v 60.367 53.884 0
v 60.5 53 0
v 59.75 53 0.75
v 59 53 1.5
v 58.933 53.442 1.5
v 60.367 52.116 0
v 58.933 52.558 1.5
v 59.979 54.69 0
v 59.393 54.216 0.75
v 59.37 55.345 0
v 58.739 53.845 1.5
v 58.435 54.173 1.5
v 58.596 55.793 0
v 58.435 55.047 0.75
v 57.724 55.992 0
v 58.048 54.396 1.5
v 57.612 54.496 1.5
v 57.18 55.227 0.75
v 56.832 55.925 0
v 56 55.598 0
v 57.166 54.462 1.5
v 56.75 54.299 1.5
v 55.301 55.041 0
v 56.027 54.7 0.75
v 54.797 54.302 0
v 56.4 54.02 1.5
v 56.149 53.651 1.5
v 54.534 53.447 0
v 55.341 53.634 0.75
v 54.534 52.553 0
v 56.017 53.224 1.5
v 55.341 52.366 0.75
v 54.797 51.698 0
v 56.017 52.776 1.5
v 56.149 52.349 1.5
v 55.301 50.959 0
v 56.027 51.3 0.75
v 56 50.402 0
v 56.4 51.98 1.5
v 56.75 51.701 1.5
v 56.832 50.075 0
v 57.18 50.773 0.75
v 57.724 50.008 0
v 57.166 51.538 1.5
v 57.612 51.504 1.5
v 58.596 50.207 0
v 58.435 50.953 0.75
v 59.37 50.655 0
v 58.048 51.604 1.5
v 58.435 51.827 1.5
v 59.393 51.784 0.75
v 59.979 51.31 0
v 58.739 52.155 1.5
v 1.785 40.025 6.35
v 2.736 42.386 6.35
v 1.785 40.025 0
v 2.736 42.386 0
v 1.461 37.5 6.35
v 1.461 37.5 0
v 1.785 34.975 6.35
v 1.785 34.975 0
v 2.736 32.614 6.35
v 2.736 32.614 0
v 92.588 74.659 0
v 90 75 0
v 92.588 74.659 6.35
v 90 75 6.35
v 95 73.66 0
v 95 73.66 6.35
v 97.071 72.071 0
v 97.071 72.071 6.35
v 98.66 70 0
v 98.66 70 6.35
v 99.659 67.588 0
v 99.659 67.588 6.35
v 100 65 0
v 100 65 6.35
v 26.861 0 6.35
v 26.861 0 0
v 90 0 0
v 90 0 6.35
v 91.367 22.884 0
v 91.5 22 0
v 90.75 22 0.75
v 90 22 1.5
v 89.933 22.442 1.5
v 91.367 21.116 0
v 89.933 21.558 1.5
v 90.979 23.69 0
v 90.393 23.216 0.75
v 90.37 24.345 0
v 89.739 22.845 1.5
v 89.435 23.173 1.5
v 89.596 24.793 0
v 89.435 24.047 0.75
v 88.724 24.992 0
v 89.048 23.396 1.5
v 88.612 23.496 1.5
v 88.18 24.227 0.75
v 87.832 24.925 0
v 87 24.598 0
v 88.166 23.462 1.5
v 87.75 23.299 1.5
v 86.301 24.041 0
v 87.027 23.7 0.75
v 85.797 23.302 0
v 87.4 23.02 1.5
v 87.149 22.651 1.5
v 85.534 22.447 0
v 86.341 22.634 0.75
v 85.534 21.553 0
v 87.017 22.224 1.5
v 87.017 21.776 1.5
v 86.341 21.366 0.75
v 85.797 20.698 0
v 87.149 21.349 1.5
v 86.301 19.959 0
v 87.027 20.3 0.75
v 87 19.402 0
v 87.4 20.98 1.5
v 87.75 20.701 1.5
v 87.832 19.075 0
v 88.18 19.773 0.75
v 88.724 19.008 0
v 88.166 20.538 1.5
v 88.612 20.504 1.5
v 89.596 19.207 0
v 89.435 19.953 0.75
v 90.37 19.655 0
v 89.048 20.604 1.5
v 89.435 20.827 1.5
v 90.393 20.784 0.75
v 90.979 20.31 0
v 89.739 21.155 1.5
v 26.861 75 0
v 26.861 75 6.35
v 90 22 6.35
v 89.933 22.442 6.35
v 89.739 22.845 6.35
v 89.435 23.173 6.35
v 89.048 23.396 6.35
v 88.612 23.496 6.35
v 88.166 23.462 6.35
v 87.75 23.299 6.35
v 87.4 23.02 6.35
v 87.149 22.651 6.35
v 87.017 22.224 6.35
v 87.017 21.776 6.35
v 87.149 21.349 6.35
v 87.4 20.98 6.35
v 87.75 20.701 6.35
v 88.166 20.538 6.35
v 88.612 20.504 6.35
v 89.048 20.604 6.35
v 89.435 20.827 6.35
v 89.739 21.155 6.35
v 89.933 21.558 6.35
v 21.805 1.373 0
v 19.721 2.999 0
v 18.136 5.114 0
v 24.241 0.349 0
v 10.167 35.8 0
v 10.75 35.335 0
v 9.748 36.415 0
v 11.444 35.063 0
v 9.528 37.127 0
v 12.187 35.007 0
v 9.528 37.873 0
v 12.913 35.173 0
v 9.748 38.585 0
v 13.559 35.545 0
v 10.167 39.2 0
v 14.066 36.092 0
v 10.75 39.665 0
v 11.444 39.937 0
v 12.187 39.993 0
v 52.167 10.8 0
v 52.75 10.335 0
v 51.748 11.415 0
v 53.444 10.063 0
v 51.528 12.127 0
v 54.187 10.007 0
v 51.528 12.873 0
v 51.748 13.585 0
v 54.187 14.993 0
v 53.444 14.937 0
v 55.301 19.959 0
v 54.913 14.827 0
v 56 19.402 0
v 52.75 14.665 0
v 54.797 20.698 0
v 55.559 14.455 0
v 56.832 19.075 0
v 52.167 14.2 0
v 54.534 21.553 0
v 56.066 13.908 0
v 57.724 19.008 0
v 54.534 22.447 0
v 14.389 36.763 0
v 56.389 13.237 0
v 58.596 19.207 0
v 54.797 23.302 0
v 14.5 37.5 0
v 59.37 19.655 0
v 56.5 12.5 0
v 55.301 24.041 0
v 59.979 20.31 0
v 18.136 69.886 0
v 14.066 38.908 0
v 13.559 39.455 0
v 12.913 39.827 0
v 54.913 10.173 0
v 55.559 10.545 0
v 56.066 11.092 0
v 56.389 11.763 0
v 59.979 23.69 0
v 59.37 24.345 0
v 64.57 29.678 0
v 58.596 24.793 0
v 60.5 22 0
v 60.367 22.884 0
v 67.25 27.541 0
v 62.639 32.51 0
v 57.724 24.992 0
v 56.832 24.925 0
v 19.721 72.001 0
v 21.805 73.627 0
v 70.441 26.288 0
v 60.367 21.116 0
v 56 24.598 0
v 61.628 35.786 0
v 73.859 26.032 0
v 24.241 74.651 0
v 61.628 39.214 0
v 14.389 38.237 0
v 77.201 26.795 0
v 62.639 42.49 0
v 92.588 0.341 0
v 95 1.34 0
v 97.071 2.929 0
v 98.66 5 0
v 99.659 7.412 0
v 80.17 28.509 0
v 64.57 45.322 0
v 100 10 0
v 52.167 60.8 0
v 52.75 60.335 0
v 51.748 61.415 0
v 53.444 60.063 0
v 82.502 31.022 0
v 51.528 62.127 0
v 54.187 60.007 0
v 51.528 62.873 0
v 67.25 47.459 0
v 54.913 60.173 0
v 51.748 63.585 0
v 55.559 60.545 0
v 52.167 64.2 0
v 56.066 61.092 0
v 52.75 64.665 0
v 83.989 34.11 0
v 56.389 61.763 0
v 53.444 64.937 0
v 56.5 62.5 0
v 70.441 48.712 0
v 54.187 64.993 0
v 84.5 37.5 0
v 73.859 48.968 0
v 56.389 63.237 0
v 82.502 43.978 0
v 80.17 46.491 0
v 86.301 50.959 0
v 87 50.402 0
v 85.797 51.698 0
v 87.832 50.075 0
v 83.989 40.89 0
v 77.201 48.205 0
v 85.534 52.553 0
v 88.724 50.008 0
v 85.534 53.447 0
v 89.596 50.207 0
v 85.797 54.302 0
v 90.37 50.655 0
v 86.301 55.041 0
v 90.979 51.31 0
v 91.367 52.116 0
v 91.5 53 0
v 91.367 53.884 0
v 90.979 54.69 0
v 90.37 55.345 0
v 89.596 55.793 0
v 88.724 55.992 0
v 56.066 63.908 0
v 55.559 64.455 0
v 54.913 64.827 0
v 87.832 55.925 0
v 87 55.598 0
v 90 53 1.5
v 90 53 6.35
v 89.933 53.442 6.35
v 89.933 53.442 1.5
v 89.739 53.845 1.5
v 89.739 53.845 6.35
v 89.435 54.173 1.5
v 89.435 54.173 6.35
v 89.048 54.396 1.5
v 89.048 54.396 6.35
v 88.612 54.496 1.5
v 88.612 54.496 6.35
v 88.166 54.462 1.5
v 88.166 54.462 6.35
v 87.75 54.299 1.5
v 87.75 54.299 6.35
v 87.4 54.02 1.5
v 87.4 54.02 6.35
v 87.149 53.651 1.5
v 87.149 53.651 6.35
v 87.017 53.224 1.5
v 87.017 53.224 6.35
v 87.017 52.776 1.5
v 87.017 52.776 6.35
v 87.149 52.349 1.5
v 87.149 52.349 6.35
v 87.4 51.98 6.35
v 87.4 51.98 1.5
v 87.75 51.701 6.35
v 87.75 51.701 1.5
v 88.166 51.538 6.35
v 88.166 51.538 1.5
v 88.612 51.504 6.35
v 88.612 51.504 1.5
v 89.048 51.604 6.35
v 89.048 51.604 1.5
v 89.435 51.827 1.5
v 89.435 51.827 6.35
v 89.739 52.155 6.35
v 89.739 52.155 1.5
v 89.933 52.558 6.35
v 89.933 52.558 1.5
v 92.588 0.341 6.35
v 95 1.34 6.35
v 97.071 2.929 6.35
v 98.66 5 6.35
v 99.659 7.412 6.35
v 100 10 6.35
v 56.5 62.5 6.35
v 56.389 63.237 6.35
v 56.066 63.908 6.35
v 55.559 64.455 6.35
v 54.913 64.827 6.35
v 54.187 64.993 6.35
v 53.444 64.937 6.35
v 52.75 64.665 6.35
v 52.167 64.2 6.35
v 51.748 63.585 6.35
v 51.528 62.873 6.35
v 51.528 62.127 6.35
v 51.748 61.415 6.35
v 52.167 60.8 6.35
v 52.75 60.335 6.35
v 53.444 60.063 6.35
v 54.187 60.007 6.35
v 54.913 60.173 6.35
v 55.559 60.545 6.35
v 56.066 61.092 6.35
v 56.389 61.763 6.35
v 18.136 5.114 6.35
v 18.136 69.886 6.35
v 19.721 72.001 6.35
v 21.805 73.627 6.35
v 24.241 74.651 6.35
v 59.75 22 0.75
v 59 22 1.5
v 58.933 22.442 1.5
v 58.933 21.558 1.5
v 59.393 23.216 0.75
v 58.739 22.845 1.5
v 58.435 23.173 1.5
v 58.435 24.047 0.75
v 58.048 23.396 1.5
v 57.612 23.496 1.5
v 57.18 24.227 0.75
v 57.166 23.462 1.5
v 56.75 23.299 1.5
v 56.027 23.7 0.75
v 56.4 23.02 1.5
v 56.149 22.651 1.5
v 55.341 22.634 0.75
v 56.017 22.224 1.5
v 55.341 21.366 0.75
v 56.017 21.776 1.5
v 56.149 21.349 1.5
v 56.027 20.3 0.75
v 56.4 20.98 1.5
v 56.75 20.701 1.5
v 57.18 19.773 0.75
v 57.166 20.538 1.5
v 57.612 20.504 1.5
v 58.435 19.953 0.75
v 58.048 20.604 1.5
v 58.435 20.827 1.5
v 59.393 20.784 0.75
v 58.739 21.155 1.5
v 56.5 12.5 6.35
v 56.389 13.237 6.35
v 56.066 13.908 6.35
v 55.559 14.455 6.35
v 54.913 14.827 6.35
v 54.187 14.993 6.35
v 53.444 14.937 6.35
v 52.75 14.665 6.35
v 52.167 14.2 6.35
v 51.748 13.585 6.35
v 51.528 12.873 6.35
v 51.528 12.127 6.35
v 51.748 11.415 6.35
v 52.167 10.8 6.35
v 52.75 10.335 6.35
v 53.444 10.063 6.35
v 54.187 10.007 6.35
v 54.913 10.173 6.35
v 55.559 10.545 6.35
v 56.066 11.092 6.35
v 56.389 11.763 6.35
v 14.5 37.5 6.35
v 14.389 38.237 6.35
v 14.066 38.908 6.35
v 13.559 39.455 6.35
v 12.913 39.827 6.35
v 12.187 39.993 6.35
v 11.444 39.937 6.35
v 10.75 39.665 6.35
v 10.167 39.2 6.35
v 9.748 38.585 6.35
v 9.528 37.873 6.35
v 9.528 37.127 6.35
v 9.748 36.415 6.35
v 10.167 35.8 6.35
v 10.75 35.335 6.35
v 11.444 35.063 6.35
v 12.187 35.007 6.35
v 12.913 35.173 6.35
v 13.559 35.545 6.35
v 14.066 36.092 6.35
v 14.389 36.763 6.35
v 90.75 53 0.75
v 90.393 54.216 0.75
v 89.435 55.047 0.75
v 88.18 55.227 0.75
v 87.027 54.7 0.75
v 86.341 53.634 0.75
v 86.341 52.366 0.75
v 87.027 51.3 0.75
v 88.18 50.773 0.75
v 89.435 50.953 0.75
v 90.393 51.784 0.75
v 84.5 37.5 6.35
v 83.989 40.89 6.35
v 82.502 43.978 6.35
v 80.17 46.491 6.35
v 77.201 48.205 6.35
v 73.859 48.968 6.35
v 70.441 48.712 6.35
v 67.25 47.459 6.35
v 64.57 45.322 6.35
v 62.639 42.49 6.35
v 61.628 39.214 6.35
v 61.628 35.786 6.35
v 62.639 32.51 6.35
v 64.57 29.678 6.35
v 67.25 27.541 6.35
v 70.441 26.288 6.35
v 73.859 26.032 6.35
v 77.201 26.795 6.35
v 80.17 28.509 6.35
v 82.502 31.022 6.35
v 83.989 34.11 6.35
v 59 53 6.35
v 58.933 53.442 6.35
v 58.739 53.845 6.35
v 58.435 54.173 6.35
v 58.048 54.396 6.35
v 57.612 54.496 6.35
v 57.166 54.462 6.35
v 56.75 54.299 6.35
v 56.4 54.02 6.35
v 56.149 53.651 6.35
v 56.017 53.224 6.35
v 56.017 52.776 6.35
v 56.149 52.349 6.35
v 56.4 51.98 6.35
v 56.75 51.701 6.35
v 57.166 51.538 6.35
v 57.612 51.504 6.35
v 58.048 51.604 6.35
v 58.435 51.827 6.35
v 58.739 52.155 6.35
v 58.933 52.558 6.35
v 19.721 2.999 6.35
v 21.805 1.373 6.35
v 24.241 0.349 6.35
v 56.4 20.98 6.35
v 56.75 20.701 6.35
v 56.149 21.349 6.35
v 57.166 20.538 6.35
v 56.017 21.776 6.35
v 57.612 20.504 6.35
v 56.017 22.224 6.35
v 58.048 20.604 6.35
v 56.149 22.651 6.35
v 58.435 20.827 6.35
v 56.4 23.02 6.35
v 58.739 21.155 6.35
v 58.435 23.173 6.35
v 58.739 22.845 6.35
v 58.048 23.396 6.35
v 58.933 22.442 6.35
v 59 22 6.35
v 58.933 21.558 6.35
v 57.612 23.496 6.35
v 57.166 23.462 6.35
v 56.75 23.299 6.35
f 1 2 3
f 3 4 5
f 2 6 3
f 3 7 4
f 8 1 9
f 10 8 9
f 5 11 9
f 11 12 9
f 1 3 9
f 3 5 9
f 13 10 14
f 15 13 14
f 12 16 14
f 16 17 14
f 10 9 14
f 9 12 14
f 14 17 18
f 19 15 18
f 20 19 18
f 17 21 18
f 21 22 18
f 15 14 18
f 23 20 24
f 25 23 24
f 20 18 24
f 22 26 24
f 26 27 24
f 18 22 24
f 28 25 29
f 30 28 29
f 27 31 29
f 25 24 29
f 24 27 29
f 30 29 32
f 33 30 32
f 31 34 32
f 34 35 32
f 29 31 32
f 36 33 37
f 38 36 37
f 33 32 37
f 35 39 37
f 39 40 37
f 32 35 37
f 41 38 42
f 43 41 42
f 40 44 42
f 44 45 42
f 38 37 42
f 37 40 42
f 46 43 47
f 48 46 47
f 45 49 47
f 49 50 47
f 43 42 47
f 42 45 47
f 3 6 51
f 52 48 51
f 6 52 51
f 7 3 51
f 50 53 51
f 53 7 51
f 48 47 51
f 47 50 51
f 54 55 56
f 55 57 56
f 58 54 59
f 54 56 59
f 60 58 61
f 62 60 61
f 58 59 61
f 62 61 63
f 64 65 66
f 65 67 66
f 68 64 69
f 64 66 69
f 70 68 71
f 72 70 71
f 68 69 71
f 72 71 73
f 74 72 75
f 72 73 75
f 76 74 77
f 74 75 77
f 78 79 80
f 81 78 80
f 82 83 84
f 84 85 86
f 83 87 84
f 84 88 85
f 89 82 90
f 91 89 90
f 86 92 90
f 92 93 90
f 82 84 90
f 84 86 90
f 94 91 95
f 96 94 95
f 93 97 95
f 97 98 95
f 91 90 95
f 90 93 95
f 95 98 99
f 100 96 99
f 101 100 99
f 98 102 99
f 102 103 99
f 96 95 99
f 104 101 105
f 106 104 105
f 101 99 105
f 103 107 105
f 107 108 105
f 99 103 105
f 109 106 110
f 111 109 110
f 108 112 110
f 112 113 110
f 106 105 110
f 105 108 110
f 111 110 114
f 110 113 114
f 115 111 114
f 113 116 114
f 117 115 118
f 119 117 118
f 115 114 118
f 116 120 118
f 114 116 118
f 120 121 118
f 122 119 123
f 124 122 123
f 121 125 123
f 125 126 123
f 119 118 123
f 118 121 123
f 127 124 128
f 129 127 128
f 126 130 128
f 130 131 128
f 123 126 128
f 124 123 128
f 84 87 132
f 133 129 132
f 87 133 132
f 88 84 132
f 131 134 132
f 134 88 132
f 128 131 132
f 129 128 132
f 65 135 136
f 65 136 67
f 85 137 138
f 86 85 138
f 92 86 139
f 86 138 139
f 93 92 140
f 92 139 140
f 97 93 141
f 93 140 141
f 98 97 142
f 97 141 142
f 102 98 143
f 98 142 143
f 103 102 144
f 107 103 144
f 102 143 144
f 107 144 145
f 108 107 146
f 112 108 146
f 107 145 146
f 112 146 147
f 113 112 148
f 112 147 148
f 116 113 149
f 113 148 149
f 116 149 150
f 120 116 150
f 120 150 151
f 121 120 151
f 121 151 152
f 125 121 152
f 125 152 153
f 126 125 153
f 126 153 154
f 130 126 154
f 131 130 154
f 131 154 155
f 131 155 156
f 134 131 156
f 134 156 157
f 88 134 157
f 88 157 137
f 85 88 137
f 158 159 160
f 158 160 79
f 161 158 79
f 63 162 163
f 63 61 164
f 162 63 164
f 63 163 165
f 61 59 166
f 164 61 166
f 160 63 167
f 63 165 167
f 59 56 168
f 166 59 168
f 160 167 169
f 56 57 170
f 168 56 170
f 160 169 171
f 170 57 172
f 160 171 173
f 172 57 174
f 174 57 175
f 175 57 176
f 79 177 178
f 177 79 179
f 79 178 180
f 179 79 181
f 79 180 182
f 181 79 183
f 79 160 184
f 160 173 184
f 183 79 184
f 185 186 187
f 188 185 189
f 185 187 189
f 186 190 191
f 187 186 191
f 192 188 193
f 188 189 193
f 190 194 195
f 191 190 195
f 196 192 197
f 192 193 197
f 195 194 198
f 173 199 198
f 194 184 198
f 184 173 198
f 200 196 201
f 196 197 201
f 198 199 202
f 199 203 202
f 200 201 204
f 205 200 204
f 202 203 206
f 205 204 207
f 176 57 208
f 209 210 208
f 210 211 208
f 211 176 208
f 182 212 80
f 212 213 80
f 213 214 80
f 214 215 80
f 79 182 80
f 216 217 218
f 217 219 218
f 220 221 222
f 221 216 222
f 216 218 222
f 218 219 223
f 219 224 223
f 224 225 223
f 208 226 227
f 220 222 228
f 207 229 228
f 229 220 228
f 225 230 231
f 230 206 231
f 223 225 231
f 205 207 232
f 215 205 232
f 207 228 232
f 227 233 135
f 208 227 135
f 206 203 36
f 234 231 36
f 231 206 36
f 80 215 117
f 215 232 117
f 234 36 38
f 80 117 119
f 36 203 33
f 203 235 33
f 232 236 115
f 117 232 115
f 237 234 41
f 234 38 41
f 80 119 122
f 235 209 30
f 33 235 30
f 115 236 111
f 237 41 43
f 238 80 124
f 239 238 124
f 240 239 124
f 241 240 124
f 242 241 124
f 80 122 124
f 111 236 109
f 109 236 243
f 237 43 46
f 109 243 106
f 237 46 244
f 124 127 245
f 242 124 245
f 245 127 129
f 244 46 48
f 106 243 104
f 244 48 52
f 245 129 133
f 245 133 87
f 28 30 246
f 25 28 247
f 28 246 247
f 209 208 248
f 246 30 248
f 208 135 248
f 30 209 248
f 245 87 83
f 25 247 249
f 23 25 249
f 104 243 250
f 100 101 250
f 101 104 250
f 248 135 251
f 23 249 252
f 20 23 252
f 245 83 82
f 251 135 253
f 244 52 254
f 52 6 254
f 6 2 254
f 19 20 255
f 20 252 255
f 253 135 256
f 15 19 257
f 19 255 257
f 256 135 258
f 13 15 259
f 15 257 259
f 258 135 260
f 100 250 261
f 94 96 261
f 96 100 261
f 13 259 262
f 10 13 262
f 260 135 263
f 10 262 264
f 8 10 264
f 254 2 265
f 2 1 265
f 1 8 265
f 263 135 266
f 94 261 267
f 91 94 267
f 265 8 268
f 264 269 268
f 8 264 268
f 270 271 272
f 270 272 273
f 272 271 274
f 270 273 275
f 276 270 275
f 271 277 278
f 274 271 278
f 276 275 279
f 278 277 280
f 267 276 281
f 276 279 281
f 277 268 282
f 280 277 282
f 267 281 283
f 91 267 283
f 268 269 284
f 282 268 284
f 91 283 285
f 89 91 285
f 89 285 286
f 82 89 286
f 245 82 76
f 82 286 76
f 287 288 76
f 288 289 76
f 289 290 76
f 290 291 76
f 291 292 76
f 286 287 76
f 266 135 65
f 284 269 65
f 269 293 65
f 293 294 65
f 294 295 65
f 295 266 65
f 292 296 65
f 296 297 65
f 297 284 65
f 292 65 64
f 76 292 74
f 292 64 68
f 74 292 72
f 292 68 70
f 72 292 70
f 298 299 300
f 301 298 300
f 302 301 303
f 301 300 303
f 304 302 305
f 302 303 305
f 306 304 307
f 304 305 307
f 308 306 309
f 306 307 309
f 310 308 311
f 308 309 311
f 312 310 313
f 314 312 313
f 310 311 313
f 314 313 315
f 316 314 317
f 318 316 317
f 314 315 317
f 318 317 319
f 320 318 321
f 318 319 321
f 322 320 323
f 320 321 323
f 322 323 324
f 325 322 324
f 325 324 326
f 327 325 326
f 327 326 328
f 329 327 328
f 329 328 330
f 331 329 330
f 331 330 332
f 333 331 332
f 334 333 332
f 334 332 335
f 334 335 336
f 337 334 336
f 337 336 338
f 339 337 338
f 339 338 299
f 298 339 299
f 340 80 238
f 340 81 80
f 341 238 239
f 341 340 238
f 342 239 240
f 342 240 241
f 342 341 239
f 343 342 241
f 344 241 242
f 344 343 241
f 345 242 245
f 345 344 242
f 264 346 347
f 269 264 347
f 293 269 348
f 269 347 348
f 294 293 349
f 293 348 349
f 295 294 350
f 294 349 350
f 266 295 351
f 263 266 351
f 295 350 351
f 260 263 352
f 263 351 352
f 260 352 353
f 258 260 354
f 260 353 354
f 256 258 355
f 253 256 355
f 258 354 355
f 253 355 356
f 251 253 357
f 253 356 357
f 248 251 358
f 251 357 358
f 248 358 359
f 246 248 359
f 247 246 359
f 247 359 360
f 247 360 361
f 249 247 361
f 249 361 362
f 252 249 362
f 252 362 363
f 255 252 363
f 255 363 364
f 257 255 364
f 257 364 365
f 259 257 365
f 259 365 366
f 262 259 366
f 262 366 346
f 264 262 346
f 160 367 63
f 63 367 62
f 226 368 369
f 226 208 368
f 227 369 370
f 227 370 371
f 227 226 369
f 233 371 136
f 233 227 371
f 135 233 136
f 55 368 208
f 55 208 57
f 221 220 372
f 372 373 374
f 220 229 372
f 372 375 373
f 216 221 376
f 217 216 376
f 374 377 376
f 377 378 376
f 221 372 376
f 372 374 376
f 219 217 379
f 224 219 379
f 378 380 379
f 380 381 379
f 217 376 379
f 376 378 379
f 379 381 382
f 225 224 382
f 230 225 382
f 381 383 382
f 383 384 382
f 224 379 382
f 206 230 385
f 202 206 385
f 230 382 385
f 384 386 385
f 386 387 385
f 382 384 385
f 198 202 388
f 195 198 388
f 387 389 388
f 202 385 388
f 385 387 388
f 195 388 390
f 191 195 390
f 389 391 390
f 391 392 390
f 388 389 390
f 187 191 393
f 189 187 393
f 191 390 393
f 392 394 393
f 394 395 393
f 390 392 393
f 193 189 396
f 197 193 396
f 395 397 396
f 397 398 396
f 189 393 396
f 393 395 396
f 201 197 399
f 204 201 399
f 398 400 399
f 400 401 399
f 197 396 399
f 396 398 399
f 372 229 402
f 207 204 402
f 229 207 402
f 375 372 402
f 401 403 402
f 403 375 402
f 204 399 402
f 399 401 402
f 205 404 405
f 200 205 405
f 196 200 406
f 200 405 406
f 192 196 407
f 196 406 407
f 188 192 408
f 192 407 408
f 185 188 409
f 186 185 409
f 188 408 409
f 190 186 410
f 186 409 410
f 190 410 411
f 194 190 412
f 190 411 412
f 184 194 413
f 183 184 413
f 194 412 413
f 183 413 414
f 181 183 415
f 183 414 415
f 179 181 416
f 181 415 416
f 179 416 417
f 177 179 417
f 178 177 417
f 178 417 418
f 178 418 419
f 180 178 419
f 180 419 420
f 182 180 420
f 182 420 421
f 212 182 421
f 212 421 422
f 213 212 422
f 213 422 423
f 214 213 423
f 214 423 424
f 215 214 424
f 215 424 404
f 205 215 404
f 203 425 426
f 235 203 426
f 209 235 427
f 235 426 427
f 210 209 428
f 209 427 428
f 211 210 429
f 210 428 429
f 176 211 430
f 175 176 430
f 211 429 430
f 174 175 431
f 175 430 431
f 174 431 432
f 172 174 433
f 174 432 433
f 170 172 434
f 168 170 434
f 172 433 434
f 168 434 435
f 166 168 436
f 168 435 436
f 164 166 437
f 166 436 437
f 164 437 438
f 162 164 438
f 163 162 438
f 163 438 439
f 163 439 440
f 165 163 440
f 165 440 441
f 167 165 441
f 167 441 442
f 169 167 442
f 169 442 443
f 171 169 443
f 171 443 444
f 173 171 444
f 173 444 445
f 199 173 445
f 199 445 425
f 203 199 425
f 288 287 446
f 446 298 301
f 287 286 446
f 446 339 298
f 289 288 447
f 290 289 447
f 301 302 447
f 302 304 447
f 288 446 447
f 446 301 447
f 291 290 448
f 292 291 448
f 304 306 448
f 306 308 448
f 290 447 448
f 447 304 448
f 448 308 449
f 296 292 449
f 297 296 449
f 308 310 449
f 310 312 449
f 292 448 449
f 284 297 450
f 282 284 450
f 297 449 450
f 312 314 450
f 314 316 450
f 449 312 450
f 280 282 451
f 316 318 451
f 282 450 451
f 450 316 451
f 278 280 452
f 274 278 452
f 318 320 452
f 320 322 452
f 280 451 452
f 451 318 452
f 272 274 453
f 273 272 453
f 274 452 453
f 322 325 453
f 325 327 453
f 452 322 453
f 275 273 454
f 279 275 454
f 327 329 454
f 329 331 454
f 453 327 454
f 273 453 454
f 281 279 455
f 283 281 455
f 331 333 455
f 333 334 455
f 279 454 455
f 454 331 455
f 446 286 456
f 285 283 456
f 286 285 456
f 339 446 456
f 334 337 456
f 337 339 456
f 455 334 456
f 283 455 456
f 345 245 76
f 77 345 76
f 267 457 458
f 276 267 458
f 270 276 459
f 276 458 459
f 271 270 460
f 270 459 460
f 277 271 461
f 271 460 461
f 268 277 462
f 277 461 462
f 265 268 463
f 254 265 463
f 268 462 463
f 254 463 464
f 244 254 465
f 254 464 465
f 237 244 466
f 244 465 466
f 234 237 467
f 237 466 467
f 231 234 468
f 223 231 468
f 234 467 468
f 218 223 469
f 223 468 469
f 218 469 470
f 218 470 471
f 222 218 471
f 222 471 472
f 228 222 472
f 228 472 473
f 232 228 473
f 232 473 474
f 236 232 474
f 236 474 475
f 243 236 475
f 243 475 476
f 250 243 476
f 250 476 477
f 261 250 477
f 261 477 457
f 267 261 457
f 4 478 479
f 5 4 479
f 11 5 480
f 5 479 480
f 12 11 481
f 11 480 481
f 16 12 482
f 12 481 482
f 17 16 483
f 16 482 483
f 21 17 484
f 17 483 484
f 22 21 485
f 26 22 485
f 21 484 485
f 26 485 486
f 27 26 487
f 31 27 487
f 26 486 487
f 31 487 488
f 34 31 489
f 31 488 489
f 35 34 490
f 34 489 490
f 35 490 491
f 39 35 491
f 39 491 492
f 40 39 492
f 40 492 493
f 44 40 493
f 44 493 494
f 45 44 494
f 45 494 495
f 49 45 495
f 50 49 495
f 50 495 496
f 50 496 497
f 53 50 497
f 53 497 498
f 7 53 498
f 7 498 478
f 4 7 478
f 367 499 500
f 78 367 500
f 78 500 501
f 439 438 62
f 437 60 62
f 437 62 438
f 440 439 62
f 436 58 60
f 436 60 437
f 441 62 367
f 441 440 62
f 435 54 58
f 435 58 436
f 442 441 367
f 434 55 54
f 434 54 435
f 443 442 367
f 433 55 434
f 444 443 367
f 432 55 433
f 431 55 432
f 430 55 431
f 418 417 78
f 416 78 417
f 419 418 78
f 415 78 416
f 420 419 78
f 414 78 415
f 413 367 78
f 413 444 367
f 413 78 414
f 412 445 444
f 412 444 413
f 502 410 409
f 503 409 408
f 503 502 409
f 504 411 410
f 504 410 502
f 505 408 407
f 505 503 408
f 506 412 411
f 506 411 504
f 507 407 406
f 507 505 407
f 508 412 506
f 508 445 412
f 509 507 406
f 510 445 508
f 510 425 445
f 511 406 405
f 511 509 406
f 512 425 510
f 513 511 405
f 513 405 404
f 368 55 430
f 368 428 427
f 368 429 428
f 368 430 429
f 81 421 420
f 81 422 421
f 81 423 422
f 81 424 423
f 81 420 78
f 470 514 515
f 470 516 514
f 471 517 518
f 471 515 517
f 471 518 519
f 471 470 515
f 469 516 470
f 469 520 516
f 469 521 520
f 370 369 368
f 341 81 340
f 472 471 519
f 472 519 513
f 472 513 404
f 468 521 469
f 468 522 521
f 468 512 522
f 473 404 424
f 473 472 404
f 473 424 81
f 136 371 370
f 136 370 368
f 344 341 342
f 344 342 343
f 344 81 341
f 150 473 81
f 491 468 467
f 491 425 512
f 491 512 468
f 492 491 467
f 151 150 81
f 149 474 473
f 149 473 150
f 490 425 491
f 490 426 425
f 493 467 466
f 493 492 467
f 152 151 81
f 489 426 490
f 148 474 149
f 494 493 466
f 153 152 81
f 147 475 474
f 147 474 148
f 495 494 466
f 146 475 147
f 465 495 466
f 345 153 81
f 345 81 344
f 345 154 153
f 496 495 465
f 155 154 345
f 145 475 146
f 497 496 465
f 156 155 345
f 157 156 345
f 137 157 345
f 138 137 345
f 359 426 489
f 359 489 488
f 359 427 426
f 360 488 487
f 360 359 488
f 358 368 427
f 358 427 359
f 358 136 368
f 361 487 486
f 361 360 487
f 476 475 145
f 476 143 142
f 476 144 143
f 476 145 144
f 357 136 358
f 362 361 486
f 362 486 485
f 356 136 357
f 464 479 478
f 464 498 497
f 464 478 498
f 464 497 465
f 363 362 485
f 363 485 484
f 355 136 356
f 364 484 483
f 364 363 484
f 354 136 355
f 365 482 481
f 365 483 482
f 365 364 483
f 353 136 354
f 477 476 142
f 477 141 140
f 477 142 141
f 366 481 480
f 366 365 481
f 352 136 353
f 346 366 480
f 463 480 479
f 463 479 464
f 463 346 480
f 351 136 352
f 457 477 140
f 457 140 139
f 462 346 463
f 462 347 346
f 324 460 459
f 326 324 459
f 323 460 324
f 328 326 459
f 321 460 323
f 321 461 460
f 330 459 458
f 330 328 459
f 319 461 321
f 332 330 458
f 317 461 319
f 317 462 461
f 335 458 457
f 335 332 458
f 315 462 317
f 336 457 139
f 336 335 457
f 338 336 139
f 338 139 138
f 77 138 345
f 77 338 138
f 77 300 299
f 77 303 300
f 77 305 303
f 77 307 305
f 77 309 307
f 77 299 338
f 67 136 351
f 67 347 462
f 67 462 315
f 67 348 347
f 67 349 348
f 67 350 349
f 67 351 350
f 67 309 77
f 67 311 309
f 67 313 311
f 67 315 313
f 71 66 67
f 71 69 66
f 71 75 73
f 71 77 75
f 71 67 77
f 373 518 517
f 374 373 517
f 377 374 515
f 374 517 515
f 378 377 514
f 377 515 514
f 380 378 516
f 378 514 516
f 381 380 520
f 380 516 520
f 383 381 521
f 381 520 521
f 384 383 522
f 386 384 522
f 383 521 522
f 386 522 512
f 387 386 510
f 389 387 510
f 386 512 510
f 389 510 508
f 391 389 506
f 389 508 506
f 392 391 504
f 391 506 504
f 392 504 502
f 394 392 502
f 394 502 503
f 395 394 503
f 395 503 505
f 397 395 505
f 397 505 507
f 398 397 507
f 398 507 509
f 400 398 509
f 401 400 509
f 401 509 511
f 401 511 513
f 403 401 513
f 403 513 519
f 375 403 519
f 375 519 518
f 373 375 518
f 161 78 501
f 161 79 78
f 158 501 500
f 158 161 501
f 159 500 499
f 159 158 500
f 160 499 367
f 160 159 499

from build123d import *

# Parameters (mm, degrees)
SKETCH1_W             = 100
SKETCH1_H             = 75
PLATE_DEPTH           = 6.35
SKETCH2_R             = 2.5
CUT_IDLER_HOLES_DEPTH = 126.161186076
SKETCH3_R             = 1.5
SKETCH3_R_2           = 11.5
CUT_MOTOR_HOLES_DEPTH = 126.161186076
CHAMFER1_SIZE         = 1.5
FILLET1_R             = 10
CUT_EXTRUDE1_DEPTH    = 6.35
FILLET5_R             = 10


with BuildPart() as part:
    # Sketch1 → plate (new body)
    with BuildSketch(Plane.XY):
        with Locations((50, 37.5)):
            Rectangle(SKETCH1_W, SKETCH1_H)
    extrude(amount=PLATE_DEPTH)

    # Sketch2 → cut idler holes (cut, through all)
    with BuildSketch(Plane.XY.offset(6.35)):
        with Locations((54, 62.5)):
            Circle(SKETCH2_R)
        with Locations((12, 37.5)):
            Circle(SKETCH2_R)
        with Locations((54, 12.5)):
            Circle(SKETCH2_R)
    extrude(amount=-CUT_IDLER_HOLES_DEPTH, mode=Mode.SUBTRACT)

    # Sketch3 → cut motor holes (cut, through all)
    with BuildSketch(Plane.XY.offset(6.35)):
        with Locations((57.5, 53)):
            Circle(SKETCH3_R)
        with Locations((88.5, 53)):
            Circle(SKETCH3_R)
        with Locations((88.5, 22)):
            Circle(SKETCH3_R)
        with Locations((57.5, 22)):
            Circle(SKETCH3_R)
        with Locations((73, 37.5)):
            Circle(SKETCH3_R_2)
    extrude(amount=-CUT_MOTOR_HOLES_DEPTH, mode=Mode.SUBTRACT)

    # Chamfer1
    chamfer1_edges = [part.edges().sort_by_distance(p)[0] for p in [
        (56, 53, 0),
        (87, 22, 0),
        (56, 22, 0),
        (87, 53, 0),
    ]]
    chamfer(chamfer1_edges, length=CHAMFER1_SIZE)

    # Fillet1
    fillet1_edges = [part.edges().sort_by_distance(p)[0] for p in [
        (0, 75, 3.175),
        (100, 75, 3.175),
        (100, 0, 3.175),
        (0, 0, 3.175),
    ]]
    fillet(fillet1_edges, radius=FILLET1_R)

    # Sketch4 → Cut-Extrude1 (cut)
    with BuildSketch(Plane.XY.offset(6.35)):
        with BuildLine():
            Line((10, 0), (21, 0))
            Line((21, 0), (0, 37.5))
            Line((0, 37.5), (0, 10))
            ThreePointArc((0, 10), (2.928932188, 2.928932188), (10, 0))
        make_face()
    cut_extrude1 = extrude(amount=-CUT_EXTRUDE1_DEPTH, mode=Mode.SUBTRACT)

    # Mirror2: Cut-Extrude1 across plane
    add(cut_extrude1.mirror(Plane(origin=(0, 37.5, 0), x_dir=(0, 0, 1), z_dir=(0, -1, 0))), mode=Mode.SUBTRACT)

    # Fillet5
    fillet5_edges = [part.edges().sort_by_distance(p)[0] for p in [
        (21, 75, 3.175),
        (0, 37.5, 3.175),
        (21, 0, 3.175),
    ]]
    fillet(fillet5_edges, radius=FILLET5_R)


solid = part.part
